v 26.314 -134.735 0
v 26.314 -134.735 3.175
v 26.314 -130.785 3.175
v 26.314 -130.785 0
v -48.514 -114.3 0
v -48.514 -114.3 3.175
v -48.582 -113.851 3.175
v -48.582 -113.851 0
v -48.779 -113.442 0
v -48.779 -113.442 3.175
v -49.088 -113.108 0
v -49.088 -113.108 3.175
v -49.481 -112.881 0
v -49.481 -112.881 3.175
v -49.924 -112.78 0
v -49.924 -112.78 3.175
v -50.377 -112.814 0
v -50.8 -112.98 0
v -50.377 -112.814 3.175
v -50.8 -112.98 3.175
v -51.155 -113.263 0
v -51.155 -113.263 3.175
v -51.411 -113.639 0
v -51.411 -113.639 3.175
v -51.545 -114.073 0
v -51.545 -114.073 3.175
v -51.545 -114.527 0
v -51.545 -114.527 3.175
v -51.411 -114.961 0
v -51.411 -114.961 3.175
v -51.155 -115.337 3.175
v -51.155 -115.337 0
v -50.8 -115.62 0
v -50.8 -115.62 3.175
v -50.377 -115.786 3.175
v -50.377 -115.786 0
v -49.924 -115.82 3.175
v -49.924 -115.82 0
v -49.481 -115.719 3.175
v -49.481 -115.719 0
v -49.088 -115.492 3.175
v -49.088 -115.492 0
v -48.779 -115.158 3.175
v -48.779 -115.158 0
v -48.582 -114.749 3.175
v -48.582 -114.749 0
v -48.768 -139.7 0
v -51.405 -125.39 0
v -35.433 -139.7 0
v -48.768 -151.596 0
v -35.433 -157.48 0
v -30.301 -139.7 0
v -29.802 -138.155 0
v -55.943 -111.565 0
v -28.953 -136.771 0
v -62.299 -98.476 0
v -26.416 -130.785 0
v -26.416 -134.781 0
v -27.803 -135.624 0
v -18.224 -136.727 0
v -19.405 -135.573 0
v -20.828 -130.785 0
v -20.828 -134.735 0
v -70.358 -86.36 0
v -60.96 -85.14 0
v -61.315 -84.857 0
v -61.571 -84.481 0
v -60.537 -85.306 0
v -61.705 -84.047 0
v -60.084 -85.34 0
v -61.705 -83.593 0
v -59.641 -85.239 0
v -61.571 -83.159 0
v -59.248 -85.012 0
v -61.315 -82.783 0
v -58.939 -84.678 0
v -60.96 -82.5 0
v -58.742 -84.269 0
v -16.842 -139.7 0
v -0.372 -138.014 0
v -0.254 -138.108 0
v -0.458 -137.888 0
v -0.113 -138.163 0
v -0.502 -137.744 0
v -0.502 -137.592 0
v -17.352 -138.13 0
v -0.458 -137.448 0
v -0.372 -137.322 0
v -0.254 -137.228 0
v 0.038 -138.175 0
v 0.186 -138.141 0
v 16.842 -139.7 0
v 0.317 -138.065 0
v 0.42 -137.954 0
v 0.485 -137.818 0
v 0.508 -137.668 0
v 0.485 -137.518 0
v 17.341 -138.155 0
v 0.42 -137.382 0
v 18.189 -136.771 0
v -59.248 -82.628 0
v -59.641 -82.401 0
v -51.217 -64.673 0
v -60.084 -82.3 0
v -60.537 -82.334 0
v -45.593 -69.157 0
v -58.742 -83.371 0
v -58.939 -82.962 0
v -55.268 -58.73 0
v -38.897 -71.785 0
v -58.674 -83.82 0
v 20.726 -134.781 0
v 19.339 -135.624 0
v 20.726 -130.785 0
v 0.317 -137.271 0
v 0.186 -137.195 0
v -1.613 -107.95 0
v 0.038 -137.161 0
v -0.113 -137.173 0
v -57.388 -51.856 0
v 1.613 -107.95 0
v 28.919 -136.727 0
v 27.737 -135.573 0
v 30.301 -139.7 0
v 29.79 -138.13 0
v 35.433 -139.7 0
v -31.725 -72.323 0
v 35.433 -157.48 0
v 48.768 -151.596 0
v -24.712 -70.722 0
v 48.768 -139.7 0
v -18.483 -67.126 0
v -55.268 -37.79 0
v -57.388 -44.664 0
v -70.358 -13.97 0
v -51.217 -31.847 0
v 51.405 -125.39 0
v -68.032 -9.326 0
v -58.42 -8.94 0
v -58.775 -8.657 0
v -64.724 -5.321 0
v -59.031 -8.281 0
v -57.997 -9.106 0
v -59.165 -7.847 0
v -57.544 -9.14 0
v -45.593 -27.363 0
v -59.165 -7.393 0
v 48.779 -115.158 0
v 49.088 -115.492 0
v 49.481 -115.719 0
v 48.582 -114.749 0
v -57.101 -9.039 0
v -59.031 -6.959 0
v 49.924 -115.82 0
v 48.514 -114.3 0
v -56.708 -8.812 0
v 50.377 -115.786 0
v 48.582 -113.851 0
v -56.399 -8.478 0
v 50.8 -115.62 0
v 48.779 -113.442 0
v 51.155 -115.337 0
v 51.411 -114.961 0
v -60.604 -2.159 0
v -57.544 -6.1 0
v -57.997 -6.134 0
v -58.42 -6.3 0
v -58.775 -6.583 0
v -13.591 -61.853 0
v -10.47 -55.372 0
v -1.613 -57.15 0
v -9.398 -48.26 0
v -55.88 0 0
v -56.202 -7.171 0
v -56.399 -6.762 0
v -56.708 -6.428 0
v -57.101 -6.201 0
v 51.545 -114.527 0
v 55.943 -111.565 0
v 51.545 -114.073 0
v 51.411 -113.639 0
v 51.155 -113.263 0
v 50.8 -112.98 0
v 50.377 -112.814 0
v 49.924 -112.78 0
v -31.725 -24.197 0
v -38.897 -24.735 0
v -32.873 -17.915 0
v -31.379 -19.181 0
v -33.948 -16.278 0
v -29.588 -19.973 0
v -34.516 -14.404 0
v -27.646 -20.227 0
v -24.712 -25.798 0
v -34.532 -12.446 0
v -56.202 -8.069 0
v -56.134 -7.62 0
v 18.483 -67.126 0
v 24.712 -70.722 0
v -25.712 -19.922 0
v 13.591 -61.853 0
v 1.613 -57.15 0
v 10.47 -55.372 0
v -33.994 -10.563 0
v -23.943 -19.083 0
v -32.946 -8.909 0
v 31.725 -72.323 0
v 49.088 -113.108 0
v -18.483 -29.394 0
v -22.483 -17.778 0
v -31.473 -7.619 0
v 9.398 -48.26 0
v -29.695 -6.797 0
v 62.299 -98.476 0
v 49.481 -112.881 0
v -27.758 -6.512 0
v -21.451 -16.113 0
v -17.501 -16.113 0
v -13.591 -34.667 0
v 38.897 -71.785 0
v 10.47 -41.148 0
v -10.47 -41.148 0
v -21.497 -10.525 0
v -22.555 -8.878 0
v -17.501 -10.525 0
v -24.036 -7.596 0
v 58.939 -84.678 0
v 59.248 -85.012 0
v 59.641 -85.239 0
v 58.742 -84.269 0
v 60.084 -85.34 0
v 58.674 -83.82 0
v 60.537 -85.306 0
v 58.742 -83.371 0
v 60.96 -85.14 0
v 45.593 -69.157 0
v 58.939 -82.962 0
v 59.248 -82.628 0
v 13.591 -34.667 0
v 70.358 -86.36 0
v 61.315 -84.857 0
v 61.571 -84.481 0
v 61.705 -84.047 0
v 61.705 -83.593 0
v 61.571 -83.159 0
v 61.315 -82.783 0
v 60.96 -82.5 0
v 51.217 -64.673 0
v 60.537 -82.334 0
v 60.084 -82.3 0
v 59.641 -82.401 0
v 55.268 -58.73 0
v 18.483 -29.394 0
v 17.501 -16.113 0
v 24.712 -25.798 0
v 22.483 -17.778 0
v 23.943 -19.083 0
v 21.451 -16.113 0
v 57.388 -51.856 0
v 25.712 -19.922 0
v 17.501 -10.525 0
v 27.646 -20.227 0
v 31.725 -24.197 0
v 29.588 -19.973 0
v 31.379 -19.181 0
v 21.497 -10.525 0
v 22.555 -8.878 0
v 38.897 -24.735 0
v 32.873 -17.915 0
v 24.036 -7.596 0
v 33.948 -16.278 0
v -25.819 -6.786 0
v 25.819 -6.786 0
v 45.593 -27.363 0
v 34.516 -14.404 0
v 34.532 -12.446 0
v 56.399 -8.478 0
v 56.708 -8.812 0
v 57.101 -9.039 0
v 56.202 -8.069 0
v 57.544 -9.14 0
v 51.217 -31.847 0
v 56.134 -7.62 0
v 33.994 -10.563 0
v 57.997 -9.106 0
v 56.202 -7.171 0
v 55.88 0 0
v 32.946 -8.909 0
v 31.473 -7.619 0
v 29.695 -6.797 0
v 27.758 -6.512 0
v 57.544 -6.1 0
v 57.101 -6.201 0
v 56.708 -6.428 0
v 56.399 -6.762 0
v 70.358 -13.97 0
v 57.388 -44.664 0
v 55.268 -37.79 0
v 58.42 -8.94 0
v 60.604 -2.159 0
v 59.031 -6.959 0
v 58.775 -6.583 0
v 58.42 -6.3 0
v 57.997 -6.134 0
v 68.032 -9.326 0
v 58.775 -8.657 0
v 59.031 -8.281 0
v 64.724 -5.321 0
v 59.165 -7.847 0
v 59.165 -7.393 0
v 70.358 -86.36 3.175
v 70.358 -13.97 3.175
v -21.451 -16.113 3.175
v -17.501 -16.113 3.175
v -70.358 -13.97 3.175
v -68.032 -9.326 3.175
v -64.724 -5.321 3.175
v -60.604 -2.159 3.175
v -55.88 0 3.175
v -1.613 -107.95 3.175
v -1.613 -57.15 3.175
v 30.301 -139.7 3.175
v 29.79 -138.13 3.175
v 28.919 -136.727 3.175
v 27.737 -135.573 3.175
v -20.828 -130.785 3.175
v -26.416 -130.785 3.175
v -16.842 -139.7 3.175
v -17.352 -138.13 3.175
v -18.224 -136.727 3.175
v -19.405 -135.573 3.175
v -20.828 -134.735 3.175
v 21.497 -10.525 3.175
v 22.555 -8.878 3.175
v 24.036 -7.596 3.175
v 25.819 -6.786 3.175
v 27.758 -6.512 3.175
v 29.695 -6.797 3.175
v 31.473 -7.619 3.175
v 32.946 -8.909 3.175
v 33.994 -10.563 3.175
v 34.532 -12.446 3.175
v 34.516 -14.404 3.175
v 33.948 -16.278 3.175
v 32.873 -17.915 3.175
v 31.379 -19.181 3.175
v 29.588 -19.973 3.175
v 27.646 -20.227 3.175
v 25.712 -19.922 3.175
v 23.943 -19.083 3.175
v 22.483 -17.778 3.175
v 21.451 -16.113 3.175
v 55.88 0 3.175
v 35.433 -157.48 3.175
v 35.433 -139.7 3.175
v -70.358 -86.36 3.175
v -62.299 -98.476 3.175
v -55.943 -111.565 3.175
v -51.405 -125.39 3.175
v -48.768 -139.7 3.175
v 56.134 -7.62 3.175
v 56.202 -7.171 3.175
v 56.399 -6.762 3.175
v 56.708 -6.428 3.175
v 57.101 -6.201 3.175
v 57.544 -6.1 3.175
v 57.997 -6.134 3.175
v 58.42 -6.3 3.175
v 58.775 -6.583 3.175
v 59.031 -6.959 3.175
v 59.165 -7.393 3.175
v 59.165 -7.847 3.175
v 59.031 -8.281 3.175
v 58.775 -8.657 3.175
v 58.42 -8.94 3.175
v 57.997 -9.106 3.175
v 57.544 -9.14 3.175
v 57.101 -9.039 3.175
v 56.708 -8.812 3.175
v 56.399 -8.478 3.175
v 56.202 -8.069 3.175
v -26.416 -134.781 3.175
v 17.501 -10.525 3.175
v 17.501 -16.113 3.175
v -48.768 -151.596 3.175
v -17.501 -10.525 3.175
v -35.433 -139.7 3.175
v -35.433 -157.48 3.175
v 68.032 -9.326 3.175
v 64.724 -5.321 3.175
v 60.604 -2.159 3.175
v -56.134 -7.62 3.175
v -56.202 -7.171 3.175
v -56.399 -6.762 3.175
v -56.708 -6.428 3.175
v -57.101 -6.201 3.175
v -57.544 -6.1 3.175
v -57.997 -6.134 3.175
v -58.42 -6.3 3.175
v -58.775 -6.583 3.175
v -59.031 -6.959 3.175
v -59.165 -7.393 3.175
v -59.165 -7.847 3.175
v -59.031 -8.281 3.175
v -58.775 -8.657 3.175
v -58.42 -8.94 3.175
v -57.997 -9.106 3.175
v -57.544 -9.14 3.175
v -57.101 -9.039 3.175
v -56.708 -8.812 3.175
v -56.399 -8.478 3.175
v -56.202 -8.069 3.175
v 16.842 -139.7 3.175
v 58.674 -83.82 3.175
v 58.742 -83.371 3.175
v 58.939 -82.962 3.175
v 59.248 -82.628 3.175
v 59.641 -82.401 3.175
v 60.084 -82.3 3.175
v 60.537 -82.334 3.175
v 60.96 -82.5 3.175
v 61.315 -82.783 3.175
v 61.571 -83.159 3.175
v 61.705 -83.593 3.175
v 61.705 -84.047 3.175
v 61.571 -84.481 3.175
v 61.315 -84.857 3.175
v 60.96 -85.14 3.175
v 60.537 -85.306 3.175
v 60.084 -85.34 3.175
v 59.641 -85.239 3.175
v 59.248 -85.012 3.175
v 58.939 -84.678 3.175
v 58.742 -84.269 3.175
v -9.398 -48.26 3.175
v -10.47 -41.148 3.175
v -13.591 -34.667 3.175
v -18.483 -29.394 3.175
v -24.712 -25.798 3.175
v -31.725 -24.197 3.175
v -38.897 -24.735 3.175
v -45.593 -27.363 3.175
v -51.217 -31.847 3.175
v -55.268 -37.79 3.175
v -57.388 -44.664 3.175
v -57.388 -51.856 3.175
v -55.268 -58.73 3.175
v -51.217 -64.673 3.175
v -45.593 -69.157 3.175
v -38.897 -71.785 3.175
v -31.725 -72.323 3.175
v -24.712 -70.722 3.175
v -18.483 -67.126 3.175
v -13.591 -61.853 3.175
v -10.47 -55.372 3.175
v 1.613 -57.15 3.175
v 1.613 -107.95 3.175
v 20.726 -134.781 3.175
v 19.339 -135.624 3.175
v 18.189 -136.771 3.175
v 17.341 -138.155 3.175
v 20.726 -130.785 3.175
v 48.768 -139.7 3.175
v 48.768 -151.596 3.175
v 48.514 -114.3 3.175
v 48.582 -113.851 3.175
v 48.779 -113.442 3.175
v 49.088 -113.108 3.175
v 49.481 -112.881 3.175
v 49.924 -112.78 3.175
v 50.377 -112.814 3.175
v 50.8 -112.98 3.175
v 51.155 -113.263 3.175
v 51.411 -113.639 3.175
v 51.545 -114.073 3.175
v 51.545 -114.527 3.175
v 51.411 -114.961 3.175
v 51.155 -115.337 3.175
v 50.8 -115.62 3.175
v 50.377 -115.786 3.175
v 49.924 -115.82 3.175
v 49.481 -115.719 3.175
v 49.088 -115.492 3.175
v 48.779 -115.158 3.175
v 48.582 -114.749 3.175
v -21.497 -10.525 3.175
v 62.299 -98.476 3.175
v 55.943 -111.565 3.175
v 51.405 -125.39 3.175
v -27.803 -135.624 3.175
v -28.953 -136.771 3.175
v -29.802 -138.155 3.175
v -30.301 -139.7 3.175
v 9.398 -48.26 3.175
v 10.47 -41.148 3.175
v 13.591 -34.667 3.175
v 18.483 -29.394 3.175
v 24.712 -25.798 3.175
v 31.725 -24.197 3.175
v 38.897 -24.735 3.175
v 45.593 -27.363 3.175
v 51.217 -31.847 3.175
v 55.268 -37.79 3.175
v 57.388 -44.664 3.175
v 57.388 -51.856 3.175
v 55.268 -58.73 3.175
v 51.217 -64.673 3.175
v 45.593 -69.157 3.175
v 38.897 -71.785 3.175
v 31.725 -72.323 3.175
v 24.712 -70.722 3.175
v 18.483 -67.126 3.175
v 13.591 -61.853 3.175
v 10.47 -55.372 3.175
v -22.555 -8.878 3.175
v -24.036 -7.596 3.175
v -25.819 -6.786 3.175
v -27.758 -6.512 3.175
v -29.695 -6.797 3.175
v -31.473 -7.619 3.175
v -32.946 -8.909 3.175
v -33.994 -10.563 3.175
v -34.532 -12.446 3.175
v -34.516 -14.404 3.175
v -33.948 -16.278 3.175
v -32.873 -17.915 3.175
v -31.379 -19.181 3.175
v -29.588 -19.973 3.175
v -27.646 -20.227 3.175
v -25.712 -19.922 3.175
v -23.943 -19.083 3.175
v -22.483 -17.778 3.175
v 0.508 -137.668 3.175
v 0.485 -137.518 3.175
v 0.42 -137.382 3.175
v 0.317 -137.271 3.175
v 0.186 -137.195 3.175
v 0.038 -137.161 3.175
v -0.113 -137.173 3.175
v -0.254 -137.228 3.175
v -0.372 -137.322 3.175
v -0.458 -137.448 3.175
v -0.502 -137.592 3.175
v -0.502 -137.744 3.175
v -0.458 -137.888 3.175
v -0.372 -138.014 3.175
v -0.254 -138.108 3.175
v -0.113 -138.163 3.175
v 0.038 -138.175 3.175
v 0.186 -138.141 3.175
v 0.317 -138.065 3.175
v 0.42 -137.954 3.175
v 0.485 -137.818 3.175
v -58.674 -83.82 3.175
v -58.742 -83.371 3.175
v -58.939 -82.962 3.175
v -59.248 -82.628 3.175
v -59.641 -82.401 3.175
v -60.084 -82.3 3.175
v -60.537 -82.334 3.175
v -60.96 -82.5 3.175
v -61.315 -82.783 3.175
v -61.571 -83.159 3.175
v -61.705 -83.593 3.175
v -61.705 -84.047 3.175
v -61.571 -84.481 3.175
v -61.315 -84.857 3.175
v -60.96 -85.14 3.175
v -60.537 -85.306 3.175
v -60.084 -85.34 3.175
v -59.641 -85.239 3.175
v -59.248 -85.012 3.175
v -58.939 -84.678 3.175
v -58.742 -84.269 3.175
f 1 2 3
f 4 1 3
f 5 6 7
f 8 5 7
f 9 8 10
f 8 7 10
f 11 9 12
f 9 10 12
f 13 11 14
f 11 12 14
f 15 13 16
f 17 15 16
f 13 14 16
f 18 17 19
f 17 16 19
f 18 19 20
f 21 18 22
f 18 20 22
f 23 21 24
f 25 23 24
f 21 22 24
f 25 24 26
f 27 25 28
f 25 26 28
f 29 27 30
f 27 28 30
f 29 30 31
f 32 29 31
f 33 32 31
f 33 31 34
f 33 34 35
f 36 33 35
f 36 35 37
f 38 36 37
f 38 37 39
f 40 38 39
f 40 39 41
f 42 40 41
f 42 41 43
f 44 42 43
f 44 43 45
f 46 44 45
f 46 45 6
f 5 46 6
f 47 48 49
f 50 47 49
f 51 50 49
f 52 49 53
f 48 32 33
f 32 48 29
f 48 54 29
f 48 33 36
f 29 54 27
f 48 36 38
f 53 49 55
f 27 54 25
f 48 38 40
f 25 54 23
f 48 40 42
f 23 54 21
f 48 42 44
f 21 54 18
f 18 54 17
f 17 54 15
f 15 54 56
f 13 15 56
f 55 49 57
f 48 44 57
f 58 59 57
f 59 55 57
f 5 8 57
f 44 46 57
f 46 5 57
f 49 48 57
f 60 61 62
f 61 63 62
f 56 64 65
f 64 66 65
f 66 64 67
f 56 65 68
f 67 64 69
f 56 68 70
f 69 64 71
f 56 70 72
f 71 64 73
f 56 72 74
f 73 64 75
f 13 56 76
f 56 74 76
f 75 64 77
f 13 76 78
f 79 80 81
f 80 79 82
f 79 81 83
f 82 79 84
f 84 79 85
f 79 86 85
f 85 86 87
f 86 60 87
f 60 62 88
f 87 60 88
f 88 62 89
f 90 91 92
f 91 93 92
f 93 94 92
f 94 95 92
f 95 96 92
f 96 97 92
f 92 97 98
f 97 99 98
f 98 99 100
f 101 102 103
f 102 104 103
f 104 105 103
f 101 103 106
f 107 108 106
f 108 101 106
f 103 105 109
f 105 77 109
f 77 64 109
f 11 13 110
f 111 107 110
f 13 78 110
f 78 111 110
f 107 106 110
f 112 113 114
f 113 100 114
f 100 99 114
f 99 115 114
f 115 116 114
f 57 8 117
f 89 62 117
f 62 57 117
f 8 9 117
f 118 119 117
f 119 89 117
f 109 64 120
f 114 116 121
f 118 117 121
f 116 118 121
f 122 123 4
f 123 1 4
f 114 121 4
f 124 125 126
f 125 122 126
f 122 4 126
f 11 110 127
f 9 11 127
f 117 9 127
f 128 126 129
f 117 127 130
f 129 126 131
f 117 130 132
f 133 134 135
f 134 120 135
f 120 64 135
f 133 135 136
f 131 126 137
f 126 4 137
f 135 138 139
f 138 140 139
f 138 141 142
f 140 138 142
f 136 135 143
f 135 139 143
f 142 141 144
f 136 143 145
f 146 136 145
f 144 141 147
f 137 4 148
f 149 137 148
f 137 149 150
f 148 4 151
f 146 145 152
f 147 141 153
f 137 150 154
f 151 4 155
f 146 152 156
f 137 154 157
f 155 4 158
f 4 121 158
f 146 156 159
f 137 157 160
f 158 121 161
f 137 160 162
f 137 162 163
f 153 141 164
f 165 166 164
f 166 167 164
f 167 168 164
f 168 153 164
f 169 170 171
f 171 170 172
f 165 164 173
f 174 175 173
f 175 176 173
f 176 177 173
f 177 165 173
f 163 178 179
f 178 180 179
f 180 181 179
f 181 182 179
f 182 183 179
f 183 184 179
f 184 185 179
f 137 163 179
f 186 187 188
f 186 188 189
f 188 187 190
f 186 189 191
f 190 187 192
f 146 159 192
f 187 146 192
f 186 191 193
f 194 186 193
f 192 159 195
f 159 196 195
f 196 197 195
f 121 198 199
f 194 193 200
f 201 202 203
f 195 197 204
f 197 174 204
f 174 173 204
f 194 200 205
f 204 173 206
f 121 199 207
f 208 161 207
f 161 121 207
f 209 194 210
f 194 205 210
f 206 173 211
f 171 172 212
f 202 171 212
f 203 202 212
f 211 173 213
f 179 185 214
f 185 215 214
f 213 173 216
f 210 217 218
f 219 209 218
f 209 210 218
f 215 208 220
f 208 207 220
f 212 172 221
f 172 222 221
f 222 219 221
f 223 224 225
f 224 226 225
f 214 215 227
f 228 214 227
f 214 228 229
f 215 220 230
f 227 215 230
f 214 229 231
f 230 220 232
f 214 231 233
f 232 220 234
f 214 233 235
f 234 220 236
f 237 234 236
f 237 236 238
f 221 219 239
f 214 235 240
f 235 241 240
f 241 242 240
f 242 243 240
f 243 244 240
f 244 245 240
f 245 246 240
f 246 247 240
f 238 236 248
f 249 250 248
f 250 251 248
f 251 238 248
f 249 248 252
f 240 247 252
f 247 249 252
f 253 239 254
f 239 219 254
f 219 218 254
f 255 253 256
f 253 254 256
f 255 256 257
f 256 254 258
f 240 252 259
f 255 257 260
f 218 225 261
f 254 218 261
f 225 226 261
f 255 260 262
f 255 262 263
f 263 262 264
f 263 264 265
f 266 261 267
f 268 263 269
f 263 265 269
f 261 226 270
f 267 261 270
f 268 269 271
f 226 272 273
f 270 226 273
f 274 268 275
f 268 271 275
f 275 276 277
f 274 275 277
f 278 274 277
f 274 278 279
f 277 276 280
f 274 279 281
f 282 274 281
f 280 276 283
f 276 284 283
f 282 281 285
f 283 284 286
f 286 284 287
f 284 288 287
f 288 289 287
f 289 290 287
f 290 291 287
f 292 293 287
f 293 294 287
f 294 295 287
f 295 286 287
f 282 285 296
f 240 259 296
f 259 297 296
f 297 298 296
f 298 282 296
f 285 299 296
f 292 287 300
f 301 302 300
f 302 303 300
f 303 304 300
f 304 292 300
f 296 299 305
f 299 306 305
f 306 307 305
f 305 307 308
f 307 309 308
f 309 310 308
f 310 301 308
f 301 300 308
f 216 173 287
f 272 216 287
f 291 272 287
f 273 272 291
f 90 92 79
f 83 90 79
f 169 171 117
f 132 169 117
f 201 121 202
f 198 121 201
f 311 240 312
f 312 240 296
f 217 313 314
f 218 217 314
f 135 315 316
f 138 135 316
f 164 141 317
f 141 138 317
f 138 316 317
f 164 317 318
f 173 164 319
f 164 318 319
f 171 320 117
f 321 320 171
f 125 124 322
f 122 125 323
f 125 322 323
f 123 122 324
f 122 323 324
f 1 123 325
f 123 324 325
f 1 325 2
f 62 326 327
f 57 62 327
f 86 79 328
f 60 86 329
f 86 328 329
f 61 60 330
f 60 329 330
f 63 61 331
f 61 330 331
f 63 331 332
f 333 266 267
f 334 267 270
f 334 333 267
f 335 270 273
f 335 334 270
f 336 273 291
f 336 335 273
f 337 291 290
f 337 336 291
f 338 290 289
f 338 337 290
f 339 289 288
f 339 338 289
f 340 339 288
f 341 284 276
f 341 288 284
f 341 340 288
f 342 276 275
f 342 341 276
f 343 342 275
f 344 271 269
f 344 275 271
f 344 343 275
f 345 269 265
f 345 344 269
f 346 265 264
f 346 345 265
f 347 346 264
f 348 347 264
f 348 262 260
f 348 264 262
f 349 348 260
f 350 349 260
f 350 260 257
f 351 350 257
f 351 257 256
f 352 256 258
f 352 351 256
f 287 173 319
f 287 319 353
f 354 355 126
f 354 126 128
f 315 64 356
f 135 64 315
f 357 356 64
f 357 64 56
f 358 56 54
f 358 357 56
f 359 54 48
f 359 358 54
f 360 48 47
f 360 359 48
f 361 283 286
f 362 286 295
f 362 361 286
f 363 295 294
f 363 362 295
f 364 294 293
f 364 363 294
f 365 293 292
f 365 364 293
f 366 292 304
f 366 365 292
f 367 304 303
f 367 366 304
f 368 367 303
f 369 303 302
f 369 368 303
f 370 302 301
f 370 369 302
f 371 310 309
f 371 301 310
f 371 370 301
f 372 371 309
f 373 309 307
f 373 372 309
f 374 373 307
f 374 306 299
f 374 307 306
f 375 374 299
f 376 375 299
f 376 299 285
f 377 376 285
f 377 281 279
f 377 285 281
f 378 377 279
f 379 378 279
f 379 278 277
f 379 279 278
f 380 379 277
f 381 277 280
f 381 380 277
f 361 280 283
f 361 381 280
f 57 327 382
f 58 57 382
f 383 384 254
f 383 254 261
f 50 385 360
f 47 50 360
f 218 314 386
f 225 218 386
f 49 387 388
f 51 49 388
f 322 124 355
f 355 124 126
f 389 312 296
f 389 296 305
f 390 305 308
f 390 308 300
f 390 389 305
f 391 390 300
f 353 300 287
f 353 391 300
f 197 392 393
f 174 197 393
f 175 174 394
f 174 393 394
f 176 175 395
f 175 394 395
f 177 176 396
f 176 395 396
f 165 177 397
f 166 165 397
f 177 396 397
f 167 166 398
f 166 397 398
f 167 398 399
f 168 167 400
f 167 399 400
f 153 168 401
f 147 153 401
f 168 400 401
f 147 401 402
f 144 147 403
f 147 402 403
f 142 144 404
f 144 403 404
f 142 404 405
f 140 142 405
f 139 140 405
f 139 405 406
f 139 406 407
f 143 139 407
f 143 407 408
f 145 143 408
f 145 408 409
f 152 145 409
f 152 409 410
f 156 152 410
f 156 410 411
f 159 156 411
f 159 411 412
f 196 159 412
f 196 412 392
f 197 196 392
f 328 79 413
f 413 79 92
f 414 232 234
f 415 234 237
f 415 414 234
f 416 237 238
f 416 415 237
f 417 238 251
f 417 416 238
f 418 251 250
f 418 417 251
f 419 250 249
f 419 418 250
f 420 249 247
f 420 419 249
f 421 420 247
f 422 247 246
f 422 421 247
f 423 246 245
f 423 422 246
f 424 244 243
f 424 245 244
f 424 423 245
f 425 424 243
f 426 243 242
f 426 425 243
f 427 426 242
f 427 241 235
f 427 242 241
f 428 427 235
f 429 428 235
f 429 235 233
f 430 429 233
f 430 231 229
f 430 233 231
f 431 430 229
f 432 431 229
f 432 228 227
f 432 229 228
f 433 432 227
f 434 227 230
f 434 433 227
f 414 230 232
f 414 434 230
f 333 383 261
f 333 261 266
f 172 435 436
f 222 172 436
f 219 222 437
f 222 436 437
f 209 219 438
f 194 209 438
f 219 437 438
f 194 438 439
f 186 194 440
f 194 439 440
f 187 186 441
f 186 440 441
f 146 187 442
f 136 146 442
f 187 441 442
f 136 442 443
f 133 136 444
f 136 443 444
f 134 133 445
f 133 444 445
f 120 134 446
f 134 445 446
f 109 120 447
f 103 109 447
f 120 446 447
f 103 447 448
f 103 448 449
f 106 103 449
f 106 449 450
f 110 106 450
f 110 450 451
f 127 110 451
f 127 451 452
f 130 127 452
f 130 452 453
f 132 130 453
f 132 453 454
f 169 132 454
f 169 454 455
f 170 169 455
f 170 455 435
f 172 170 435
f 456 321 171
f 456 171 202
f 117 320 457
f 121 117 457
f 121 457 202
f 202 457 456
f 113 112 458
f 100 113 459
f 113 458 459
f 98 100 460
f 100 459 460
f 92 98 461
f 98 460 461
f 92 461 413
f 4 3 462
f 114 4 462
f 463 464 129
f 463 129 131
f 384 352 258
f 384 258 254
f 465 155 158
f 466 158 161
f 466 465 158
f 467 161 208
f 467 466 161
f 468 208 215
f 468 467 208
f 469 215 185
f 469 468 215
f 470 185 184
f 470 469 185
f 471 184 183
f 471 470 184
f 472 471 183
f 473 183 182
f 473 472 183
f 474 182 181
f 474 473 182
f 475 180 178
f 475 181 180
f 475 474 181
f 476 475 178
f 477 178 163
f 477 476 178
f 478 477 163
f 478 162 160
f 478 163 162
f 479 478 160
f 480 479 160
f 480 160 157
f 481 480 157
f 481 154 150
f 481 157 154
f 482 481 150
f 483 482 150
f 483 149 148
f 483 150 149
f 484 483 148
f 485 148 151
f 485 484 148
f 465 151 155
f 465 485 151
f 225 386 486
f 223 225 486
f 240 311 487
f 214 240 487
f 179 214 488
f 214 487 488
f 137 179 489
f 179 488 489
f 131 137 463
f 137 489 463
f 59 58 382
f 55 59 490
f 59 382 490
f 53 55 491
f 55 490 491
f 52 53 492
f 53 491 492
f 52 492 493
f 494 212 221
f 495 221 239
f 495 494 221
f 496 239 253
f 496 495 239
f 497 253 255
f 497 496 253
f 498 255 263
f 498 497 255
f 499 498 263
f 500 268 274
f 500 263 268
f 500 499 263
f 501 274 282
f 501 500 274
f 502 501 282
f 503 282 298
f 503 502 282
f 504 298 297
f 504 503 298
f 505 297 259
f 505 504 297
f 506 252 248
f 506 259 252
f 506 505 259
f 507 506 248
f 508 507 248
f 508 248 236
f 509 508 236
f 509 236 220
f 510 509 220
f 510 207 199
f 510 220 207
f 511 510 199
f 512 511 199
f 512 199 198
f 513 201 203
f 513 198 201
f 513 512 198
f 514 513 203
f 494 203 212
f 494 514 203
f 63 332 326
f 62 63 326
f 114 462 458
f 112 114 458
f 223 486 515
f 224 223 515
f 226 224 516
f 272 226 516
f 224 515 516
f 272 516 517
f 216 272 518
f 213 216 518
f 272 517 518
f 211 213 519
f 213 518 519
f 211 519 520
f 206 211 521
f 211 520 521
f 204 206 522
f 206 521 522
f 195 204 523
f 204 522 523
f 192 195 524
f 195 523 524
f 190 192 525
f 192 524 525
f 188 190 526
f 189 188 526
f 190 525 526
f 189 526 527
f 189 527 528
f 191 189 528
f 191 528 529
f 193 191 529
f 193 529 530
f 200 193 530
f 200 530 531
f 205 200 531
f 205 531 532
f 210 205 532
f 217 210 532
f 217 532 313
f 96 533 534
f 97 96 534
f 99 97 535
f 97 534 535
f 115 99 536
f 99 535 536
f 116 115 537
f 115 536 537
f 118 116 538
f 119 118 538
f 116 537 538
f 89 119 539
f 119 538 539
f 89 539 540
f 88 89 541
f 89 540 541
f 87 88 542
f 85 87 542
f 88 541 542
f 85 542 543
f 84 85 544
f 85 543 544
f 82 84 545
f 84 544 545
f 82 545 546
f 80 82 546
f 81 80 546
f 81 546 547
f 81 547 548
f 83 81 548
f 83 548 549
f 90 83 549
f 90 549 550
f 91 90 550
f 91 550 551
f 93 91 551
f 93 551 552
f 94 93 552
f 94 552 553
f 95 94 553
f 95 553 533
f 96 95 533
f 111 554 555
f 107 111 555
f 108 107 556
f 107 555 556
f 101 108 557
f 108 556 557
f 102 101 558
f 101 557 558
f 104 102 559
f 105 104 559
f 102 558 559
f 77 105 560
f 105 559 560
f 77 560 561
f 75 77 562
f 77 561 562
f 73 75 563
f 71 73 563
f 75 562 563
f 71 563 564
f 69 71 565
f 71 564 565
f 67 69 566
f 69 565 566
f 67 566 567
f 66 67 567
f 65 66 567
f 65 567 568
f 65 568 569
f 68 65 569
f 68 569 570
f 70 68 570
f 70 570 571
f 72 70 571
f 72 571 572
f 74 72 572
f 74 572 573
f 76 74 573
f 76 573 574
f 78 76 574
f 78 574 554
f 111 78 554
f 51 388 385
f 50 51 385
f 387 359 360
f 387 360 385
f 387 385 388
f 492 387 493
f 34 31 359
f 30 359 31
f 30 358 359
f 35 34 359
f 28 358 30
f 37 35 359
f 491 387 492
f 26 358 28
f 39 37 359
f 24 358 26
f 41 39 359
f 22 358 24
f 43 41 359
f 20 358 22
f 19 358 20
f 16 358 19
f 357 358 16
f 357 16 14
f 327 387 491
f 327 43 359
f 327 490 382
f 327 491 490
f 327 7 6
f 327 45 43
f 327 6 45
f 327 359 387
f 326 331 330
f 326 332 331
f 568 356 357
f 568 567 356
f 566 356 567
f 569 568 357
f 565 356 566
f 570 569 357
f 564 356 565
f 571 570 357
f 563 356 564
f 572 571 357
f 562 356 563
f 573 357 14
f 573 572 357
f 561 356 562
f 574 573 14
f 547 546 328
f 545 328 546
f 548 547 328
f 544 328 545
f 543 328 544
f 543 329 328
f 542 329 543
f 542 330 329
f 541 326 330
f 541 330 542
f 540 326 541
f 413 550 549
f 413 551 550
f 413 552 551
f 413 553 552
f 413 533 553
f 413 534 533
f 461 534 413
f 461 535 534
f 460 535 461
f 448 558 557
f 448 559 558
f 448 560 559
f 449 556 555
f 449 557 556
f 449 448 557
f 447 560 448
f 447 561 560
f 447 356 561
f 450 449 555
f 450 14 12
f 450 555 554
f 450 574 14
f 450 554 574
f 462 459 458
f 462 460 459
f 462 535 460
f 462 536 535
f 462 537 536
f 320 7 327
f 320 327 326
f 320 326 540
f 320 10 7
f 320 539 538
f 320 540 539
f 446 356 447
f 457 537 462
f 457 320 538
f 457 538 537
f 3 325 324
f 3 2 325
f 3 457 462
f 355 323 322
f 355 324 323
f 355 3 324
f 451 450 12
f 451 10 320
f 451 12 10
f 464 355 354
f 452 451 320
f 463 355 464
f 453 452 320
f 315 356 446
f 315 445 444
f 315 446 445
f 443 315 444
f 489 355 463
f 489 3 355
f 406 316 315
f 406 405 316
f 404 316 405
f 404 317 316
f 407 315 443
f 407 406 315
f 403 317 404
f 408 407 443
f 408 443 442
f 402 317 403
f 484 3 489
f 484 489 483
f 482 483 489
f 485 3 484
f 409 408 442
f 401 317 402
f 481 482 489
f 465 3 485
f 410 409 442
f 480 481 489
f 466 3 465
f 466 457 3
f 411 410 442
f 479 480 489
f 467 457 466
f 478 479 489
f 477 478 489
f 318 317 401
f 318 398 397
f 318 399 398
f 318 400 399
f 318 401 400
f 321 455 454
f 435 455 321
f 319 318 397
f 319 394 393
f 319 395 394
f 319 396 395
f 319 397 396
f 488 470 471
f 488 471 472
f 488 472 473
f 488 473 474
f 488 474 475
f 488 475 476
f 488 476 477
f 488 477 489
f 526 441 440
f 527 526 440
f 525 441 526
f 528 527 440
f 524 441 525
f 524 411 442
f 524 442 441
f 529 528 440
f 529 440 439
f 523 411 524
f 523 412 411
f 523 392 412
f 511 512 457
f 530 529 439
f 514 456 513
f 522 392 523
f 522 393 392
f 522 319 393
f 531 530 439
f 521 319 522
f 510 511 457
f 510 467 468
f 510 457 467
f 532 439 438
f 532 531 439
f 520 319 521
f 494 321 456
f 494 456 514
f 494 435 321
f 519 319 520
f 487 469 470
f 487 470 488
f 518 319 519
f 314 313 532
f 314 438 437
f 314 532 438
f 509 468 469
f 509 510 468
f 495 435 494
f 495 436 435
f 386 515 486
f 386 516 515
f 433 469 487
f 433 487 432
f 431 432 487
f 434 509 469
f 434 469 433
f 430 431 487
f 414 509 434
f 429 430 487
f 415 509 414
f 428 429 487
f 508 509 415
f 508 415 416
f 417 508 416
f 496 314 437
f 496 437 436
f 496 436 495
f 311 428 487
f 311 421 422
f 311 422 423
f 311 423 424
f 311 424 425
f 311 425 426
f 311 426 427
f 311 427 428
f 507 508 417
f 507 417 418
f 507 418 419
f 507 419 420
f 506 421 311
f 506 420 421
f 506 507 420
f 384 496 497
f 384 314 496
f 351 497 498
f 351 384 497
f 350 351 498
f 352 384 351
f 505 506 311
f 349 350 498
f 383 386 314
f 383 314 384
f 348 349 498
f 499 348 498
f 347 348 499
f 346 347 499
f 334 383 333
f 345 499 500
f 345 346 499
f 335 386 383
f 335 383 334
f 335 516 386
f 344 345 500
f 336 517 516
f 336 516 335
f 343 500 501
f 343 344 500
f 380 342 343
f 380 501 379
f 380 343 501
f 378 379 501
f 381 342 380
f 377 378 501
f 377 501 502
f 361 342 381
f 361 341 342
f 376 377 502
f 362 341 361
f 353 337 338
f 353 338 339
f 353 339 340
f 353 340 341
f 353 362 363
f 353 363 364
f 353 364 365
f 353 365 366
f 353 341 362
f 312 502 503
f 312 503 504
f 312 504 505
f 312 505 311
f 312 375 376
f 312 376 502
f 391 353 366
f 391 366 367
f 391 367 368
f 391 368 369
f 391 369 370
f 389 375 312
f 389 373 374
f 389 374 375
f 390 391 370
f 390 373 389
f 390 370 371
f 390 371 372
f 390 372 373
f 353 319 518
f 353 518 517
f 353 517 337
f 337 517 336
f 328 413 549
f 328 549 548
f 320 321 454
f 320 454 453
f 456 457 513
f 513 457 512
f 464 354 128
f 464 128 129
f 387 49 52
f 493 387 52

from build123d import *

# Parameters (mm, degrees)
SKETCH1_W                           = 140.716
SKETCH1_H                           = 139.7
MAIN_BODY_DEPTH                     = 3.175
SKETCH2_R                           = 24.13
CUTS_FOR_EYES_AND_MOTORS_DEPTH      = 4.175
SKETCH4_W                           = 3.2258
SKETCH4_H                           = 50.8
CUT_FOR_NOSE_DEPTH                  = 4.175
CUT_FOR_ROUNDED_FACE_FEATURES_DEPTH = 4.175
SKETCH12_R                          = 1.524
HOLES_FOR_SPACERS_DEPTH             = 4.175
BOSS_EXTRUDE1_DEPTH                 = 3.175
CUT_EXTRUDE1_DEPTH                  = 4.175
SKETCH16_R                          = 0.508
CUT_EXTRUDE2_DEPTH                  = 4.175


with BuildPart() as part:
    # Sketch1 → main body (new body)
    with BuildSketch(Plane.XY):
        with Locations((0, -69.85)):
            Rectangle(SKETCH1_W, SKETCH1_H)
    extrude(amount=MAIN_BODY_DEPTH)

    # Sketch2 → cuts for eyes and motors (cut, through all)
    with BuildSketch(Plane.XY.offset(3.175)):
        with Locations((-33.528, -48.26)):
            Circle(SKETCH2_R)
        with BuildLine():
            Line((-17.500552949, -13.319125673), (-17.500552949, -10.525125673))
            Line((-17.500552949, -10.525125673), (-21.496618579, -10.525125673))
            ThreePointArc((-21.496618579, -10.525125673), (-34.59452735, -13.425551762), (-21.451292126, -16.113125673))
            Line((-21.451292126, -16.113125673), (-17.500552949, -16.113125673))
            Line((-17.500552949, -16.113125673), (-17.500552949, -13.319125673))
        make_face()
    cuts_for_eyes_and_motors = extrude(amount=-CUTS_FOR_EYES_AND_MOTORS_DEPTH, mode=Mode.SUBTRACT)

    # Sketch4 → cut for nose (cut, through all)
    with BuildSketch(Plane.XY.offset(3.175)):
        with Locations((0, -82.55)):
            Rectangle(SKETCH4_W, SKETCH4_H)
    extrude(amount=-CUT_FOR_NOSE_DEPTH, mode=Mode.SUBTRACT)

    # Mirror1: cuts for eyes and motors across plane
    add(cuts_for_eyes_and_motors.mirror(Plane(origin=(0, 0, 0), x_dir=(0, 0, 1), z_dir=(1, 0, 0))), mode=Mode.SUBTRACT)

    # Sketch11 → cut for rounded face features (cut, through all)
    with BuildSketch(Plane.XY.offset(3.175)):
        with BuildLine():
            Line((-70.358, -139.7), (-70.358, -86.36))
            ThreePointArc((-70.358, -86.36), (-55.943359781, -111.56490753), (-48.768, -139.7))
            Line((-48.768, -139.7), (-70.358, -139.7))
        make_face()
        with BuildLine():
            Line((-70.358, 0), (-70.358, -13.97))
            ThreePointArc((-70.358, -13.97), (-64.724440046, -5.321180316), (-55.88, 0))
            Line((-55.88, 0), (-70.358, 0))
        make_face()
    cut_for_rounded_face_features = extrude(amount=-CUT_FOR_ROUNDED_FACE_FEATURES_DEPTH, mode=Mode.SUBTRACT)

    # mirror of rounded feature: cut for rounded face features across plane
    add(cut_for_rounded_face_features.mirror(Plane(origin=(0, 0, 0), x_dir=(0, 0, 1), z_dir=(1, 0, 0))), mode=Mode.SUBTRACT)

    # Sketch12 → holes for spacers (cut, through all)
    with BuildSketch(Plane.XY.offset(3.175)):
        with Locations((-57.658, -7.62)):
            Circle(SKETCH12_R)
        with Locations((-60.198, -83.82)):
            Circle(SKETCH12_R)
        with Locations((-50.038, -114.3)):
            Circle(SKETCH12_R)
    holes_for_spacers = extrude(amount=-HOLES_FOR_SPACERS_DEPTH, mode=Mode.SUBTRACT)

    # mirror of spacer hole: holes for spacers across plane
    add(holes_for_spacers.mirror(Plane(origin=(0, 0, 0), x_dir=(0, 0, 1), z_dir=(1, 0, 0))), mode=Mode.SUBTRACT)

    # Sketch14 → Boss-Extrude1 (add)
    with BuildSketch(Plane.XY.offset(3.175)):
        Polygon((-48.768, -139.7), (-35.433, -139.7), (-35.433, -157.48), (-48.768, -151.596070028), align=None)
    boss_extrude1 = extrude(amount=-BOSS_EXTRUDE1_DEPTH)

    # Mirror3: Boss-Extrude1 across plane
    add(boss_extrude1.mirror(Plane(origin=(0, 0, 0), x_dir=(0, 0, 1), z_dir=(1, 0, 0))))

    # Sketch15 → Cut-Extrude1 (cut, through all)
    with BuildSketch(Plane.XY.offset(3.175)):
        with BuildLine():
            Line((-23.622, -130.7846), (-26.416, -130.7846))
            Line((-26.416, -130.7846), (-26.416, -134.78066563))
            ThreePointArc((-26.416, -134.78066563), (-23.515573911, -147.878574401), (-20.828, -134.735339177))
            Line((-20.828, -134.735339177), (-20.828, -130.7846))
            Line((-20.828, -130.7846), (-23.622, -130.7846))
        make_face()
        with BuildLine():
            Line((23.5204, -130.7846), (20.7264, -130.7846))
            Line((20.7264, -130.7846), (20.7264, -134.78066563))
            ThreePointArc((20.7264, -134.78066563), (23.626826089, -147.878574401), (26.3144, -134.735339177))
            Line((26.3144, -134.735339177), (26.3144, -130.7846))
            Line((26.3144, -130.7846), (23.5204, -130.7846))
        make_face()
    extrude(amount=-CUT_EXTRUDE1_DEPTH, mode=Mode.SUBTRACT)

    # Sketch16 → Cut-Extrude2 (cut, through all)
    with BuildSketch(Plane.XY.offset(3.175)):
        with Locations((0, -137.668)):
            Circle(SKETCH16_R)
    extrude(amount=-CUT_EXTRUDE2_DEPTH, mode=Mode.SUBTRACT)


solid = part.part
